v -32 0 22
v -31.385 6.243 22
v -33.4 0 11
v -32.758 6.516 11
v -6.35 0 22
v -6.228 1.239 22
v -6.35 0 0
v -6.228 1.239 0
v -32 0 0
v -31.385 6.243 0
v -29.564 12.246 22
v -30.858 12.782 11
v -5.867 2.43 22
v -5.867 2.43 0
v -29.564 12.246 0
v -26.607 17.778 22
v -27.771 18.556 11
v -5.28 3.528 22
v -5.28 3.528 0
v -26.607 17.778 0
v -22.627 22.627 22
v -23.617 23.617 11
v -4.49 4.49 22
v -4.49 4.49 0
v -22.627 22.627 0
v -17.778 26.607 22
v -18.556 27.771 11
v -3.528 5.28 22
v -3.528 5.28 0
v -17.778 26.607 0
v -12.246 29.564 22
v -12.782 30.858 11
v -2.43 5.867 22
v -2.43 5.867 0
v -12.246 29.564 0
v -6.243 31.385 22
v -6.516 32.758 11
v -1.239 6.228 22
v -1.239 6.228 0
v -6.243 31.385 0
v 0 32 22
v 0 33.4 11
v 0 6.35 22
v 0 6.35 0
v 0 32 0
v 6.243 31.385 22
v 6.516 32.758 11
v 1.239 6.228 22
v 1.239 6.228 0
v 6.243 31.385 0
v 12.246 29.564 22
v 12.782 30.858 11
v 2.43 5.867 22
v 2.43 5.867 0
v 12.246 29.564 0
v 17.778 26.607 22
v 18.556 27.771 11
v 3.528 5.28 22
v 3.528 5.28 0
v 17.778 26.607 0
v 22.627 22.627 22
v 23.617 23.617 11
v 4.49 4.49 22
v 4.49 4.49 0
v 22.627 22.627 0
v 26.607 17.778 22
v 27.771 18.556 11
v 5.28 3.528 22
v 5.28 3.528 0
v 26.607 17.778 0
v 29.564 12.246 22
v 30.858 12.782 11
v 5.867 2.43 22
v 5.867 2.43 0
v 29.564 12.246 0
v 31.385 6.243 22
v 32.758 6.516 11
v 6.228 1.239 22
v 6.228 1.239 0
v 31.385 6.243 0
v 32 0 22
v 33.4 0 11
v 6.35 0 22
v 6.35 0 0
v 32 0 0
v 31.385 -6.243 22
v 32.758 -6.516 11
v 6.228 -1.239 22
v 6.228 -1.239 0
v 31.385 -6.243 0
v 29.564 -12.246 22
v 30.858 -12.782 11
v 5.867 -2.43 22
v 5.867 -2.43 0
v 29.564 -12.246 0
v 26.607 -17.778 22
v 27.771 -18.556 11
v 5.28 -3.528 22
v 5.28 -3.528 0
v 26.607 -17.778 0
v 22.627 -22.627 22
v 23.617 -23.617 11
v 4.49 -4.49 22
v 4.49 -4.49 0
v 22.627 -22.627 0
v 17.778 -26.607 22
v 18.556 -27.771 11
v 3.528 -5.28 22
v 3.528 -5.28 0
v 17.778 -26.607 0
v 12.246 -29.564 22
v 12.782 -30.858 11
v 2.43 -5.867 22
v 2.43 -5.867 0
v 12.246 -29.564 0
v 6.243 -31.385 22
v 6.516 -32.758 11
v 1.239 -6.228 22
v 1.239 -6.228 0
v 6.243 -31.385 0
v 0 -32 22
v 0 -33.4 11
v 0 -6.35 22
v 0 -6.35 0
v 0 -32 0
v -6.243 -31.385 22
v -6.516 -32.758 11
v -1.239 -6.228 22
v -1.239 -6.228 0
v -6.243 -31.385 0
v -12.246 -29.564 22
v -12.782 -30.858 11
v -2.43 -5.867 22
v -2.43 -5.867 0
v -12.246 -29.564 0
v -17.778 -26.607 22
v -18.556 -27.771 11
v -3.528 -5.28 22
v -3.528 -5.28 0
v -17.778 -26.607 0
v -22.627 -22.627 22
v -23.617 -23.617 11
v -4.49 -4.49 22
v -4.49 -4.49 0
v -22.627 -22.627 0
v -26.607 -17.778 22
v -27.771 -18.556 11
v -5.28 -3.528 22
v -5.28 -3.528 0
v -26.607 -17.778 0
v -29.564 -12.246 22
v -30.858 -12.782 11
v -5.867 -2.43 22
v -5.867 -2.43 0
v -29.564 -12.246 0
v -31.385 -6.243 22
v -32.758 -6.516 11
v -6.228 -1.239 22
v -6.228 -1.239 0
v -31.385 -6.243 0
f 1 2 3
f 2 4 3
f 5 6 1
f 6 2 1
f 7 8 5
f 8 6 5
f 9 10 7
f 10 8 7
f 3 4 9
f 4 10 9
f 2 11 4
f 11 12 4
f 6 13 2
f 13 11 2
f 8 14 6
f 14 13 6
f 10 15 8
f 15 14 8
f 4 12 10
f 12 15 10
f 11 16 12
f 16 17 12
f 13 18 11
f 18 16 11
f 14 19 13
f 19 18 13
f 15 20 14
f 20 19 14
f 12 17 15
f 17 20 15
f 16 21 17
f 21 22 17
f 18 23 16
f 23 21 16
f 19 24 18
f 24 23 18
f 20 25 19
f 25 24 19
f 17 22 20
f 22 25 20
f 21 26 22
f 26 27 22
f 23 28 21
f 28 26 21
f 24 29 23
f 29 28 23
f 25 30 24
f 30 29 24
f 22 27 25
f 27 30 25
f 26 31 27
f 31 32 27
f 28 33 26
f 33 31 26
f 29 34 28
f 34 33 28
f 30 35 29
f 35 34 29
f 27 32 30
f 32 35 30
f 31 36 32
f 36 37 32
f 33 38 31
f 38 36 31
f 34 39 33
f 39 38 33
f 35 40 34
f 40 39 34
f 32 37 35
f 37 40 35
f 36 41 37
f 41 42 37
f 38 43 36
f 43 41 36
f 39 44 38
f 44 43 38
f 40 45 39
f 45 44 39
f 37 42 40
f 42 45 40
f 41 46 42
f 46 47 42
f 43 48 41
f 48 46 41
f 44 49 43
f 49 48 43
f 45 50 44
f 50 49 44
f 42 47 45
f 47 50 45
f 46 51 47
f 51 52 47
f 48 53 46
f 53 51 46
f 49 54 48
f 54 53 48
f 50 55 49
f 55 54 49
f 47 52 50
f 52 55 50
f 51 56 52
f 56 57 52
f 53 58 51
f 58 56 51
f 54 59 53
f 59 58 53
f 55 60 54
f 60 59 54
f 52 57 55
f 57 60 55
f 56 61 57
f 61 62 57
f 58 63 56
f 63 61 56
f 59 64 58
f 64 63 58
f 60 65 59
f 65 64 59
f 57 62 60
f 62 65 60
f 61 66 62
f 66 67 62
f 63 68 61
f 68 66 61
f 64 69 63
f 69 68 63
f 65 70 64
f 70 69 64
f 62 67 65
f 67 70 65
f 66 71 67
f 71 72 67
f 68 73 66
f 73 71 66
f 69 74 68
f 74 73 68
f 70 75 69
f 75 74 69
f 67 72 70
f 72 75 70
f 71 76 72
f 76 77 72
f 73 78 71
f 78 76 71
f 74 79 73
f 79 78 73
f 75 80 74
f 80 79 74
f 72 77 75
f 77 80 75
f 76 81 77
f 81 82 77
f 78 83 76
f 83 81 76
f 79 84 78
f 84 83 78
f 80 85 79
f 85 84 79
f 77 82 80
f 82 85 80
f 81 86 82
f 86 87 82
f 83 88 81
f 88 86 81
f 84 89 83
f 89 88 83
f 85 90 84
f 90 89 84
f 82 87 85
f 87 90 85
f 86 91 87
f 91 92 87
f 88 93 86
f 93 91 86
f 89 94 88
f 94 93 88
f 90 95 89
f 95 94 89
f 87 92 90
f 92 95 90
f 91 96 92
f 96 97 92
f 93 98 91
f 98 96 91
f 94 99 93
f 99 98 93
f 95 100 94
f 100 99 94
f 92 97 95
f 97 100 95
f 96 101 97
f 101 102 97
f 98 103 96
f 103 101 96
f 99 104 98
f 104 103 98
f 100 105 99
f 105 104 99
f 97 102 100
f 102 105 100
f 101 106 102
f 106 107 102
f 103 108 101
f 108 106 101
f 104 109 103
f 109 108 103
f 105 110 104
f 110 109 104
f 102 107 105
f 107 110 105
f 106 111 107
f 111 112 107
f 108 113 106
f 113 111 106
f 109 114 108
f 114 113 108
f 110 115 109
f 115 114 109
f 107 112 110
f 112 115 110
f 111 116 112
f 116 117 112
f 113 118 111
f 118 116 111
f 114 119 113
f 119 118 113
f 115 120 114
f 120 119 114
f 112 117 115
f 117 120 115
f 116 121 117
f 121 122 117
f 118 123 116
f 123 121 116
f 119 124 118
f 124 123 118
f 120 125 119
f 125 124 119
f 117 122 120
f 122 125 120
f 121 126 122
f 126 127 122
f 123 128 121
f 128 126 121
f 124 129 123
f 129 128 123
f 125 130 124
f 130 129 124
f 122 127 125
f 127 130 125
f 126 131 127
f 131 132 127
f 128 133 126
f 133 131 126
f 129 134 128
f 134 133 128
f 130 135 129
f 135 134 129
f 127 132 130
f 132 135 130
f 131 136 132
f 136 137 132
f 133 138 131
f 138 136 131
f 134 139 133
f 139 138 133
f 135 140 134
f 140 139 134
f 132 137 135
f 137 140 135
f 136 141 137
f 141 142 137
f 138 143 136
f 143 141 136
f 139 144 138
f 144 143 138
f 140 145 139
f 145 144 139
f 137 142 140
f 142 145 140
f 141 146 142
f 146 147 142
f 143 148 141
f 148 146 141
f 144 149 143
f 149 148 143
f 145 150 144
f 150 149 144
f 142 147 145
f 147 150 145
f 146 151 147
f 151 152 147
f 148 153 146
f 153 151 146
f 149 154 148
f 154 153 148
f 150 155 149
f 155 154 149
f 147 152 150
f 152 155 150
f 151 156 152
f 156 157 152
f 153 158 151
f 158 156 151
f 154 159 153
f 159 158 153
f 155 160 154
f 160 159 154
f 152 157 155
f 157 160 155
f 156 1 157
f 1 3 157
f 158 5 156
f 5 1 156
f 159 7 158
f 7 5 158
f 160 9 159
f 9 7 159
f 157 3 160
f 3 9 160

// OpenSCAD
$fn = 32;

// ----------------------------------------------------------------------
// Belt roller: 64 mm barrel, 22 mm wide, bore 12.7 mm
// ----------------------------------------------------------------------

// --- parameters (mm) ---
bore_d = 12.7;            // bore
barrel_d = 64;            // barrel diameter
roller_w = 22;            // roller width
crown = 1.4;              // crown height at mid width

roller_profile = [[6.35, 0], [32, 0], [33.4, 11], [32, 22], [6.35, 22]];

/* the profile stays clear of the axis, so the bore comes out of the revolve */
rotate_extrude() polygon(roller_profile);
